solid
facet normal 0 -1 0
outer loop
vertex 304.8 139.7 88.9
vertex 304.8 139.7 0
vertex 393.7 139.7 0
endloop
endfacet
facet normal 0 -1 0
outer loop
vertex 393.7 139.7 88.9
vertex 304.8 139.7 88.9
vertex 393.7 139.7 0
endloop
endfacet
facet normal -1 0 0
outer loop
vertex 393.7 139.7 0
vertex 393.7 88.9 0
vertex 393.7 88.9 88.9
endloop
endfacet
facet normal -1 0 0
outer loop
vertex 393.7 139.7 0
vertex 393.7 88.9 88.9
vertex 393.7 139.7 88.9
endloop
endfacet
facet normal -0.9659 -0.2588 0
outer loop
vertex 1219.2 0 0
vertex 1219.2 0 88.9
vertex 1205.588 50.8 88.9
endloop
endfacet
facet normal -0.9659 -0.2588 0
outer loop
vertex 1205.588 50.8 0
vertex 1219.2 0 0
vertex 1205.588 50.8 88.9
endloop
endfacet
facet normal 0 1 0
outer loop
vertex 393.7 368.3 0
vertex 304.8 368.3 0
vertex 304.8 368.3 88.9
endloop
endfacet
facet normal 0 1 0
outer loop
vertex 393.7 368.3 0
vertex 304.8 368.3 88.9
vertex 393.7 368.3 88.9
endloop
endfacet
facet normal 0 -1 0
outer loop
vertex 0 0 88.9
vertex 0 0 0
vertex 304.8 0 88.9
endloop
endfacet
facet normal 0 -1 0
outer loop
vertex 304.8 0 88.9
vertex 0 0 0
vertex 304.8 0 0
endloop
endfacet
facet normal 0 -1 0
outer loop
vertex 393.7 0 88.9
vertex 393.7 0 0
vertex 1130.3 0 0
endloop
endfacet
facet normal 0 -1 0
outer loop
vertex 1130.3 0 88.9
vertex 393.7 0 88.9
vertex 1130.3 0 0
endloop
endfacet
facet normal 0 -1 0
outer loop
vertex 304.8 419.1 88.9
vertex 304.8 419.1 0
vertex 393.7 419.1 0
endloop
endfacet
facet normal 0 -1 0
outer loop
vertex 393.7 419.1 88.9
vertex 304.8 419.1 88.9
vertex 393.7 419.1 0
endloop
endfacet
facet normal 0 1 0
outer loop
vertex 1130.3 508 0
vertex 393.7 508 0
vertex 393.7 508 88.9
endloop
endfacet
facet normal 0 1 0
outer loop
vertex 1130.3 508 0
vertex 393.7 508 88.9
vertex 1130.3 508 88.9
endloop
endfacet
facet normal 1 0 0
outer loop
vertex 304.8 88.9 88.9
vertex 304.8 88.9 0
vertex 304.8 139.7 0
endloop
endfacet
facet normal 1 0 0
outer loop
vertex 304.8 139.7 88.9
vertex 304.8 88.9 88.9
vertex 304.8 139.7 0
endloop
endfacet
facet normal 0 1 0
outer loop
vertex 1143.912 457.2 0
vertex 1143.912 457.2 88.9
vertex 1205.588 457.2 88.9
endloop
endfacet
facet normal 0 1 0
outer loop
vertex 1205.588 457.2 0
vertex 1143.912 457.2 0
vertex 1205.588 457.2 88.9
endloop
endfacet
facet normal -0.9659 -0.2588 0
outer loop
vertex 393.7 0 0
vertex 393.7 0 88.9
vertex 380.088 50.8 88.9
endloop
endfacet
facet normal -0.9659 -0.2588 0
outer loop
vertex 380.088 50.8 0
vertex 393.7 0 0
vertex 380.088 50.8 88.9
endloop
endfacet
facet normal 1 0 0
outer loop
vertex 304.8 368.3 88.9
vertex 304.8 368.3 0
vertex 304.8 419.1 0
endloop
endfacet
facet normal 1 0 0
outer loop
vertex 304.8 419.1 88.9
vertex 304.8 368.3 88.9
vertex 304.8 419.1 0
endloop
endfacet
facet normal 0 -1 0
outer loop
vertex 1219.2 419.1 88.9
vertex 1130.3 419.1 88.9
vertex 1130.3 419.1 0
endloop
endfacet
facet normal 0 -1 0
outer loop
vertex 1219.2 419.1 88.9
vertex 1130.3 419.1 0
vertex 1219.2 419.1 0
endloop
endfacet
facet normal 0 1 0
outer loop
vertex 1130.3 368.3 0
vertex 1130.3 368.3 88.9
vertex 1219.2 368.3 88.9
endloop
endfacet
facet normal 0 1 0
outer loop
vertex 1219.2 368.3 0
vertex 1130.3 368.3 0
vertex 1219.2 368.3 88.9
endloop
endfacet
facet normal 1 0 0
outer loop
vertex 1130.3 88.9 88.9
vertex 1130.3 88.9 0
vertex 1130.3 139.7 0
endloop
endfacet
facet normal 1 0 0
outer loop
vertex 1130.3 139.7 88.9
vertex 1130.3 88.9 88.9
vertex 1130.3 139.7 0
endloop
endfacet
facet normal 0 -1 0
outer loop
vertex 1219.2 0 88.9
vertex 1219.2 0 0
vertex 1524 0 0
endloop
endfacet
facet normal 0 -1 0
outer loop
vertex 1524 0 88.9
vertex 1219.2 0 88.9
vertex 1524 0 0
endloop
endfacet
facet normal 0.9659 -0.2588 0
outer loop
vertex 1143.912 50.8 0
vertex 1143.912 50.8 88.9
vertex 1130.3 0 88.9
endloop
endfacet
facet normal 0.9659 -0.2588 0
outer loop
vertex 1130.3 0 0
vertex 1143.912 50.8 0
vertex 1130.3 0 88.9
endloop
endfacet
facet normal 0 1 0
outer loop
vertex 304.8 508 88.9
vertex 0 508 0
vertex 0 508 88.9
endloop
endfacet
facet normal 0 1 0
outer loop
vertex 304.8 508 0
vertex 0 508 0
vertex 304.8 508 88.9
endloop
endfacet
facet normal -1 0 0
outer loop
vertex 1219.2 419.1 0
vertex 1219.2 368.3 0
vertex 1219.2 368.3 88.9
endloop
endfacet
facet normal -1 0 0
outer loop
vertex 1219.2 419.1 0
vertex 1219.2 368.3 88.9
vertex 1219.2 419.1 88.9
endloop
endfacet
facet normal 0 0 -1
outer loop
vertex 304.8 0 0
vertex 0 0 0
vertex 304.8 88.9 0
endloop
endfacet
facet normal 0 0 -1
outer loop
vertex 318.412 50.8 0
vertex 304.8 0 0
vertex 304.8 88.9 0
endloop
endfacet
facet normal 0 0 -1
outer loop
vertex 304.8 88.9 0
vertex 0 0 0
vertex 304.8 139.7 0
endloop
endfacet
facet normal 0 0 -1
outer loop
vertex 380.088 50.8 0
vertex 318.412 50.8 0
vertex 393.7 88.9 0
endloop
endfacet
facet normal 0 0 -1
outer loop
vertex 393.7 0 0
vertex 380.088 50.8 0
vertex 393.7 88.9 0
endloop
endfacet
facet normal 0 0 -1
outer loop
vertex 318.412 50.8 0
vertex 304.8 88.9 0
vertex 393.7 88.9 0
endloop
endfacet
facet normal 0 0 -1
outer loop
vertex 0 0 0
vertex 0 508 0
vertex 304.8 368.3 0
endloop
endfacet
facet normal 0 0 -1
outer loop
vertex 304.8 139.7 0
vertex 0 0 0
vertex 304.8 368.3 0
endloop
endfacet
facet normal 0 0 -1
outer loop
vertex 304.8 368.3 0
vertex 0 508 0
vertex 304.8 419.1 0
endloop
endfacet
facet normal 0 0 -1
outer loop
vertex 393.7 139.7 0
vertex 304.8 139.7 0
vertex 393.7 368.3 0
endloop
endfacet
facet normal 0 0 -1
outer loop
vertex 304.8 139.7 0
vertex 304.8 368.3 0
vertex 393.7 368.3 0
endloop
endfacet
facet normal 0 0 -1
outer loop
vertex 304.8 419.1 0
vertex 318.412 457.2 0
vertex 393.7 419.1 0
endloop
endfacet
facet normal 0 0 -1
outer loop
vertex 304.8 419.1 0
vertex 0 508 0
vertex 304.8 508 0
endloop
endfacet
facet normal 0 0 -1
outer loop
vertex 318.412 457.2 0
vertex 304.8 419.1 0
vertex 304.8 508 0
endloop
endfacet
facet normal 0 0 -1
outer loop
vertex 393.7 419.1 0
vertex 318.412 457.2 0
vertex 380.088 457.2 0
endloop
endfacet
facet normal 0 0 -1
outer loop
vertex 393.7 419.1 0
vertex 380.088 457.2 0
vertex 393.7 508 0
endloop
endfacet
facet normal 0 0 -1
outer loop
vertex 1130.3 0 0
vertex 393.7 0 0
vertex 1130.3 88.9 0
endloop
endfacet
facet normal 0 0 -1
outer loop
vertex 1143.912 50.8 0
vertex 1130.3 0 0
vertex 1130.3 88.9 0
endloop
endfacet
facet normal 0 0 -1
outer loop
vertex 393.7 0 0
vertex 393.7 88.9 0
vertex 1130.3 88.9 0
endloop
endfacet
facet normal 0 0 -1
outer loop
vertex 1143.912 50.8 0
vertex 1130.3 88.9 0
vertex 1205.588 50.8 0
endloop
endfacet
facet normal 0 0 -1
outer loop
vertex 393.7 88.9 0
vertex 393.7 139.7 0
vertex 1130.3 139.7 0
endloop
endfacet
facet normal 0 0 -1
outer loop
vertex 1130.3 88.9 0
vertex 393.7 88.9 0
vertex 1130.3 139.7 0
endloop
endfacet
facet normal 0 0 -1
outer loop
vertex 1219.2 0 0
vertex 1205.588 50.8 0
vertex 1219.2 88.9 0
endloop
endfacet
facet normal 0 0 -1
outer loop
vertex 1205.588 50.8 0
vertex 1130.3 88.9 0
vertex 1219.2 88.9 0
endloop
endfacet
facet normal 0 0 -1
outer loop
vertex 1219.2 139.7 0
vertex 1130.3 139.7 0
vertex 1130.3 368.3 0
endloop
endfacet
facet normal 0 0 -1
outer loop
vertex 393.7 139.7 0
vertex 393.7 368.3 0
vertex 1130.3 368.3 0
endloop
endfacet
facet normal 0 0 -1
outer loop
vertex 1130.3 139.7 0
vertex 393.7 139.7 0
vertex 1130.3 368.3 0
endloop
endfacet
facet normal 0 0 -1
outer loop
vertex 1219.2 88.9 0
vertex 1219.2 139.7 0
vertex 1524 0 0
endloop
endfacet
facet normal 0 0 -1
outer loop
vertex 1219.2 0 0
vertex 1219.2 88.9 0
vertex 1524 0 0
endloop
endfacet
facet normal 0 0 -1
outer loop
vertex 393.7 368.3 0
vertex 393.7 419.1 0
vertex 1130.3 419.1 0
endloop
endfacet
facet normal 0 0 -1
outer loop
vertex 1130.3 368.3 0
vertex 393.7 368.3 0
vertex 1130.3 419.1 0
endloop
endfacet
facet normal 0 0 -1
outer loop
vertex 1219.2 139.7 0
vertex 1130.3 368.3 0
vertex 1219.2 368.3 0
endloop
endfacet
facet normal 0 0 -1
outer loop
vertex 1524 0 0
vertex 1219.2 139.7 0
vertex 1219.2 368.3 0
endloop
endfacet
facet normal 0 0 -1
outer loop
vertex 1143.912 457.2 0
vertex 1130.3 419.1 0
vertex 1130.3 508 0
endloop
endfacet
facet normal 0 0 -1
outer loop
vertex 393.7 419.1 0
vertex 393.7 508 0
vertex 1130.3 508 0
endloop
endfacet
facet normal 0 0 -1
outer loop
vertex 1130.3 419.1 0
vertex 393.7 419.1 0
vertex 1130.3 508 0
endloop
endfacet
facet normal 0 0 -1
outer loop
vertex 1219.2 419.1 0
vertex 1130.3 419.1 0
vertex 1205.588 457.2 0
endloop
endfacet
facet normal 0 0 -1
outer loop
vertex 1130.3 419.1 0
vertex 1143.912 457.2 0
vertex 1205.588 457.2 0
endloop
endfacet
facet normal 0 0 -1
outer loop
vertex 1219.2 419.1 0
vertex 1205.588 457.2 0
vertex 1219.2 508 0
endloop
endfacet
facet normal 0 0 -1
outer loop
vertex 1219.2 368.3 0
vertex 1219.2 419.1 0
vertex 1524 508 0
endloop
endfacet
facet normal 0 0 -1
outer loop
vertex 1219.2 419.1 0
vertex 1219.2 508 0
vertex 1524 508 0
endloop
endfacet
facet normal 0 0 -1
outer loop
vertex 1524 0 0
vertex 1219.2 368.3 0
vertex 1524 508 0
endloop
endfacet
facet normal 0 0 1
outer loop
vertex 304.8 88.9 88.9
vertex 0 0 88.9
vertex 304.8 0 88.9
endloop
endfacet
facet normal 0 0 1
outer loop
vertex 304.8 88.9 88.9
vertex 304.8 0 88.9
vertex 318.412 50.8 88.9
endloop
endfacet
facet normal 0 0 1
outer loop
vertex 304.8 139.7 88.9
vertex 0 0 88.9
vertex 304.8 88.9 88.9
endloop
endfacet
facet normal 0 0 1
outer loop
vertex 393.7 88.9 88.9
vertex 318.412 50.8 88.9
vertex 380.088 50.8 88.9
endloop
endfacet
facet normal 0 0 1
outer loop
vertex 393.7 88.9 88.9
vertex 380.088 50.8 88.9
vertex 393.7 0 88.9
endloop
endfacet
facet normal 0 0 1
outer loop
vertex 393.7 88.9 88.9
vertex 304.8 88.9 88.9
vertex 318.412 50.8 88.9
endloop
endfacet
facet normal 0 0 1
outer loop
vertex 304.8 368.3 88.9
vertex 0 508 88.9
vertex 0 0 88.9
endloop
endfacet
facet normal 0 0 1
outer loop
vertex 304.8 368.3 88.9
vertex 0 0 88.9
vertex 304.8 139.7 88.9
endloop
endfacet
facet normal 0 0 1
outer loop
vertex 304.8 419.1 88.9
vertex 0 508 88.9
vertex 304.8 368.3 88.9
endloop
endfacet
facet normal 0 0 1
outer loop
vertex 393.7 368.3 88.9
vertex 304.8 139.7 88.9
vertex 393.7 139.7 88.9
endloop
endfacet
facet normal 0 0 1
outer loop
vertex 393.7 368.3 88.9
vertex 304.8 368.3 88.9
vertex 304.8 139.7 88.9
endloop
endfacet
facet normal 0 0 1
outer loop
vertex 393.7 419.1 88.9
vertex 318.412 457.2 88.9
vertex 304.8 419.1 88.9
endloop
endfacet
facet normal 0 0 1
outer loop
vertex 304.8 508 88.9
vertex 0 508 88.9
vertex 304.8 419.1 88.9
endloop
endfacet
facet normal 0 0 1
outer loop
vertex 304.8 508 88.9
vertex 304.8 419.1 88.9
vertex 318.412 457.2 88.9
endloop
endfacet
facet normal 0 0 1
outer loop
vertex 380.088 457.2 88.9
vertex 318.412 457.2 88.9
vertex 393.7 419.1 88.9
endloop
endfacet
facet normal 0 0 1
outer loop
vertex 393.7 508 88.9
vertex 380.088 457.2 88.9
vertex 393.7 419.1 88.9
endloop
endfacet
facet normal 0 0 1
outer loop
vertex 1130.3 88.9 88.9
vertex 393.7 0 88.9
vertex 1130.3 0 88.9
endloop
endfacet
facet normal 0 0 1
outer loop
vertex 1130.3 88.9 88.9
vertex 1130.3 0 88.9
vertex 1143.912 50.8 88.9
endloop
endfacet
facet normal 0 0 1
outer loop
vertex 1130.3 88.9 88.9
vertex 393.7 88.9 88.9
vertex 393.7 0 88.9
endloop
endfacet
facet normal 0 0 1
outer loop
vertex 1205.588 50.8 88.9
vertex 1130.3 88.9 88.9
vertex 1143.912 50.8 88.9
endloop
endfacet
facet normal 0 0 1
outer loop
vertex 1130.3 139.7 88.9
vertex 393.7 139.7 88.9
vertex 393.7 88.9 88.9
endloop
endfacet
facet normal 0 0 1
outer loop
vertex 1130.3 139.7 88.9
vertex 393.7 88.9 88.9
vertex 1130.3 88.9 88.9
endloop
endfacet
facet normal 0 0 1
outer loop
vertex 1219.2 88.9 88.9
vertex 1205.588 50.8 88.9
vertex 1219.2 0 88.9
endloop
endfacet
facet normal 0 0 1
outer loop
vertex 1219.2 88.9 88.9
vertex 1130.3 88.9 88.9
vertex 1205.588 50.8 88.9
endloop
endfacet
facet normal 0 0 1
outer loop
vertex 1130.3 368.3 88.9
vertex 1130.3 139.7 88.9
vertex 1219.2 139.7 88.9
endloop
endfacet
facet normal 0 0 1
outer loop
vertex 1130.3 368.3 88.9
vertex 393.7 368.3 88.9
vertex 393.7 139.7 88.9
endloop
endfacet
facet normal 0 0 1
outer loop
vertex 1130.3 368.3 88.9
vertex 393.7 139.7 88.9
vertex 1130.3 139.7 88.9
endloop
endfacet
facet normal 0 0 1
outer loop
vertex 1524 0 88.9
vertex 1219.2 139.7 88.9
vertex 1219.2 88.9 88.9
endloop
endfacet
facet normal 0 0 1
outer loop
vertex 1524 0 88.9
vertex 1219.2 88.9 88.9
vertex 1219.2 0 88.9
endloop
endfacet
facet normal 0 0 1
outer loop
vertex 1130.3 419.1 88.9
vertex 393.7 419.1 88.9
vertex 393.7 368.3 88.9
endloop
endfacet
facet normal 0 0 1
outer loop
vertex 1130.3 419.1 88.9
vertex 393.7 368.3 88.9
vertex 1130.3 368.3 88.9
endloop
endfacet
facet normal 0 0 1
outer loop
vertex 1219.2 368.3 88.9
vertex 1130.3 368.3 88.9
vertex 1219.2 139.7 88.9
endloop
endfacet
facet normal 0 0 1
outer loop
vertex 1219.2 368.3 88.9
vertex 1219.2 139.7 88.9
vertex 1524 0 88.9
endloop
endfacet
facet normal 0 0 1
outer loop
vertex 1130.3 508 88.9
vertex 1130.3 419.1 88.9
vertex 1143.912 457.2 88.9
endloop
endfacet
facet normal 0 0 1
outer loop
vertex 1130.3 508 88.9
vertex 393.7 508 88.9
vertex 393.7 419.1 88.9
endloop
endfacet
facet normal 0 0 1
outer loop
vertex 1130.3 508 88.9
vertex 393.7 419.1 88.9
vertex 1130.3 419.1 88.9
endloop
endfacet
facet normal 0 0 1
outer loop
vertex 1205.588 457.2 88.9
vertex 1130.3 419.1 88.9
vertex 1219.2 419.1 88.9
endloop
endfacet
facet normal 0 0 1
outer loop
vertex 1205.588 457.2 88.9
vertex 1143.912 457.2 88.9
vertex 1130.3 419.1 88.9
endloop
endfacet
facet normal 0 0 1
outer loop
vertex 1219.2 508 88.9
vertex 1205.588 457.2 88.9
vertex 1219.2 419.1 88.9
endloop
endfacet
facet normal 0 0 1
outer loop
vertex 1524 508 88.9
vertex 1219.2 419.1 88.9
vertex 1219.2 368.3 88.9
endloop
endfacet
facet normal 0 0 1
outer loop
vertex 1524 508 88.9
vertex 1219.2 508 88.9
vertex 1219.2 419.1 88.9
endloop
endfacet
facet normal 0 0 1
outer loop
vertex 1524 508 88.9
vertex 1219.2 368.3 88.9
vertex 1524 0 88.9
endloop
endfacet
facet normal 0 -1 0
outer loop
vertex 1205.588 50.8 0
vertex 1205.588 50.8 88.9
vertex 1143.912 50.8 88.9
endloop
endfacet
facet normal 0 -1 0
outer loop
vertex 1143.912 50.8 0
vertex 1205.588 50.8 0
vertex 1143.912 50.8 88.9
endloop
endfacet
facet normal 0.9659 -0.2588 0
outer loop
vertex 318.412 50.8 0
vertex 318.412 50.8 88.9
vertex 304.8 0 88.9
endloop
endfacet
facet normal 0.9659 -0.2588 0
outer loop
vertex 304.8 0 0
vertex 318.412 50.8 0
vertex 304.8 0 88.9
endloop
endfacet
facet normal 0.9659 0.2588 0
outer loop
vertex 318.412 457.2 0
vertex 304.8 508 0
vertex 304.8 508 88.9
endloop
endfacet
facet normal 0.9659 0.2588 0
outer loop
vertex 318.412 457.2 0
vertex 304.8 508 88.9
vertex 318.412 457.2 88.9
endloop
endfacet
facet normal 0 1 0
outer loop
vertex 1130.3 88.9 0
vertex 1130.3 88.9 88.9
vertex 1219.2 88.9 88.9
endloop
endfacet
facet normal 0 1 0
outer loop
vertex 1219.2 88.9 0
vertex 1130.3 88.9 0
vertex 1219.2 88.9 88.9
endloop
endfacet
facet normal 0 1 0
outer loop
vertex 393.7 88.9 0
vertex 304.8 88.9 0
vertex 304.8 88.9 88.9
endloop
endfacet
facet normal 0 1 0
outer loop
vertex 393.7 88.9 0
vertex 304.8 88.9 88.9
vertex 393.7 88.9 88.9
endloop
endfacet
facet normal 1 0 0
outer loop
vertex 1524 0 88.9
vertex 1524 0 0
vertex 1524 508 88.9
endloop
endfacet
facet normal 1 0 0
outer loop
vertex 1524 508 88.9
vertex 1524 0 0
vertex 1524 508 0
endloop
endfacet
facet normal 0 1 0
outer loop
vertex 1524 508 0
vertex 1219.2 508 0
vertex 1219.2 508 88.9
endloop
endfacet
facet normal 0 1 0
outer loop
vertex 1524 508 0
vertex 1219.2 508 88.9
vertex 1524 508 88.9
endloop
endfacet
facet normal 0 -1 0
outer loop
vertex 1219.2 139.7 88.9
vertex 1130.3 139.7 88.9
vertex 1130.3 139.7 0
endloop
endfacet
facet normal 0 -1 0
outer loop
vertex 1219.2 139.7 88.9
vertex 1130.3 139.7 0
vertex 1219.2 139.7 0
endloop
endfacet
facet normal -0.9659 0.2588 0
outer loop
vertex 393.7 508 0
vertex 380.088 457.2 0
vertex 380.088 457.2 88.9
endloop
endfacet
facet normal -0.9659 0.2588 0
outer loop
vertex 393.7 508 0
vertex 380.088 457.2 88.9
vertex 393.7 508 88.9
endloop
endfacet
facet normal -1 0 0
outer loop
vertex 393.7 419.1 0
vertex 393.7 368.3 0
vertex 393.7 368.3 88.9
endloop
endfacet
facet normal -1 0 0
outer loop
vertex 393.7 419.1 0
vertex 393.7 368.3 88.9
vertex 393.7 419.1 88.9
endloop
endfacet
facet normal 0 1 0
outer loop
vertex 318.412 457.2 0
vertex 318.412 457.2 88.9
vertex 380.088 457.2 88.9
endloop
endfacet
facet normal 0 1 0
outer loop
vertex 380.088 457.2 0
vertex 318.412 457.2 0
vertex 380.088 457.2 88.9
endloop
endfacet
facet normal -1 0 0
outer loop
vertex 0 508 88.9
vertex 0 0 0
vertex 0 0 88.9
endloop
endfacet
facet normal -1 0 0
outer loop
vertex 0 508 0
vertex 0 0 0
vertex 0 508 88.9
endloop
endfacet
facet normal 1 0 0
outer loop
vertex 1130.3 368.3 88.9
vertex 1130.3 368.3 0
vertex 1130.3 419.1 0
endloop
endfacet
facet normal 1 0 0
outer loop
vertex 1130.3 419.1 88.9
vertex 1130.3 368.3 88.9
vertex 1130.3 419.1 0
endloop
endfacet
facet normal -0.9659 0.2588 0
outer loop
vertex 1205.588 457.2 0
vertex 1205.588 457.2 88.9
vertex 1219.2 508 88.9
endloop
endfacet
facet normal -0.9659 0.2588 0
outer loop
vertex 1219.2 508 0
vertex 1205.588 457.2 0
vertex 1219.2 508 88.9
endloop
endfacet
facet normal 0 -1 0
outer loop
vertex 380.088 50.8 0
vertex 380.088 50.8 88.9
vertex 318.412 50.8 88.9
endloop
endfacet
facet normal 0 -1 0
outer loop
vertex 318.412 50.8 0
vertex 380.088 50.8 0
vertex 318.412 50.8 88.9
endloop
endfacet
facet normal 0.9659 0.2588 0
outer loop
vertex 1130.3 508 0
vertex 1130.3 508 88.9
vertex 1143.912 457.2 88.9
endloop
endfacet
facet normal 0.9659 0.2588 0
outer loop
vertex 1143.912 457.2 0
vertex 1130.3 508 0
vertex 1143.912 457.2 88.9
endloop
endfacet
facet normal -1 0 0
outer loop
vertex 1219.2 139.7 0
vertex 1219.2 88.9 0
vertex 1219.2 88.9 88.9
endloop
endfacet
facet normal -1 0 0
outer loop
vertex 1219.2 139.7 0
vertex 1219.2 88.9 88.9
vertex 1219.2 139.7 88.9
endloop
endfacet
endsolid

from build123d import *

# Parameters (mm, degrees)
F0_W     = 1524
F0_H     = 508
F1_DEPTH = 88.9
F2_W     = 88.9
F2_H     = 50.8
F3_DEPTH = 88.9


with BuildPart() as f1:
    # F0 (on Top) → F1 (new body)
    with BuildSketch(Plane.XY):
        with Locations((762, 254)):
            Rectangle(F0_W, F0_H)
    extrude(amount=F1_DEPTH)

    # F2 (on face) → F3 (cut, through all)
    with BuildSketch(Plane.XY.offset(88.9)):
        Polygon((318.411819, 50.8), (304.8, 0), (393.7, 0), (380.088181, 50.8), align=None)
        with Locations((349.25, 114.3)):
            Rectangle(F2_W, F2_H)
        Polygon((1143.911819, 50.8), (1130.3, 0), (1219.2, 0), (1205.588181, 50.8), align=None)
        with Locations((1174.75, 114.3)):
            Rectangle(F2_W, F2_H)
        Polygon((318.411819, 457.2), (380.088181, 457.2), (393.7, 508), (304.8, 508), align=None)
        with Locations((1174.75, 393.7)):
            Rectangle(F2_W, F2_H)
        with Locations((349.25, 393.7)):
            Rectangle(F2_W, F2_H)
        Polygon((1205.588181, 457.2), (1219.2, 508), (1130.3, 508), (1143.911819, 457.2), align=None)
    extrude(amount=-F3_DEPTH, mode=Mode.SUBTRACT)


solid = f1.part
